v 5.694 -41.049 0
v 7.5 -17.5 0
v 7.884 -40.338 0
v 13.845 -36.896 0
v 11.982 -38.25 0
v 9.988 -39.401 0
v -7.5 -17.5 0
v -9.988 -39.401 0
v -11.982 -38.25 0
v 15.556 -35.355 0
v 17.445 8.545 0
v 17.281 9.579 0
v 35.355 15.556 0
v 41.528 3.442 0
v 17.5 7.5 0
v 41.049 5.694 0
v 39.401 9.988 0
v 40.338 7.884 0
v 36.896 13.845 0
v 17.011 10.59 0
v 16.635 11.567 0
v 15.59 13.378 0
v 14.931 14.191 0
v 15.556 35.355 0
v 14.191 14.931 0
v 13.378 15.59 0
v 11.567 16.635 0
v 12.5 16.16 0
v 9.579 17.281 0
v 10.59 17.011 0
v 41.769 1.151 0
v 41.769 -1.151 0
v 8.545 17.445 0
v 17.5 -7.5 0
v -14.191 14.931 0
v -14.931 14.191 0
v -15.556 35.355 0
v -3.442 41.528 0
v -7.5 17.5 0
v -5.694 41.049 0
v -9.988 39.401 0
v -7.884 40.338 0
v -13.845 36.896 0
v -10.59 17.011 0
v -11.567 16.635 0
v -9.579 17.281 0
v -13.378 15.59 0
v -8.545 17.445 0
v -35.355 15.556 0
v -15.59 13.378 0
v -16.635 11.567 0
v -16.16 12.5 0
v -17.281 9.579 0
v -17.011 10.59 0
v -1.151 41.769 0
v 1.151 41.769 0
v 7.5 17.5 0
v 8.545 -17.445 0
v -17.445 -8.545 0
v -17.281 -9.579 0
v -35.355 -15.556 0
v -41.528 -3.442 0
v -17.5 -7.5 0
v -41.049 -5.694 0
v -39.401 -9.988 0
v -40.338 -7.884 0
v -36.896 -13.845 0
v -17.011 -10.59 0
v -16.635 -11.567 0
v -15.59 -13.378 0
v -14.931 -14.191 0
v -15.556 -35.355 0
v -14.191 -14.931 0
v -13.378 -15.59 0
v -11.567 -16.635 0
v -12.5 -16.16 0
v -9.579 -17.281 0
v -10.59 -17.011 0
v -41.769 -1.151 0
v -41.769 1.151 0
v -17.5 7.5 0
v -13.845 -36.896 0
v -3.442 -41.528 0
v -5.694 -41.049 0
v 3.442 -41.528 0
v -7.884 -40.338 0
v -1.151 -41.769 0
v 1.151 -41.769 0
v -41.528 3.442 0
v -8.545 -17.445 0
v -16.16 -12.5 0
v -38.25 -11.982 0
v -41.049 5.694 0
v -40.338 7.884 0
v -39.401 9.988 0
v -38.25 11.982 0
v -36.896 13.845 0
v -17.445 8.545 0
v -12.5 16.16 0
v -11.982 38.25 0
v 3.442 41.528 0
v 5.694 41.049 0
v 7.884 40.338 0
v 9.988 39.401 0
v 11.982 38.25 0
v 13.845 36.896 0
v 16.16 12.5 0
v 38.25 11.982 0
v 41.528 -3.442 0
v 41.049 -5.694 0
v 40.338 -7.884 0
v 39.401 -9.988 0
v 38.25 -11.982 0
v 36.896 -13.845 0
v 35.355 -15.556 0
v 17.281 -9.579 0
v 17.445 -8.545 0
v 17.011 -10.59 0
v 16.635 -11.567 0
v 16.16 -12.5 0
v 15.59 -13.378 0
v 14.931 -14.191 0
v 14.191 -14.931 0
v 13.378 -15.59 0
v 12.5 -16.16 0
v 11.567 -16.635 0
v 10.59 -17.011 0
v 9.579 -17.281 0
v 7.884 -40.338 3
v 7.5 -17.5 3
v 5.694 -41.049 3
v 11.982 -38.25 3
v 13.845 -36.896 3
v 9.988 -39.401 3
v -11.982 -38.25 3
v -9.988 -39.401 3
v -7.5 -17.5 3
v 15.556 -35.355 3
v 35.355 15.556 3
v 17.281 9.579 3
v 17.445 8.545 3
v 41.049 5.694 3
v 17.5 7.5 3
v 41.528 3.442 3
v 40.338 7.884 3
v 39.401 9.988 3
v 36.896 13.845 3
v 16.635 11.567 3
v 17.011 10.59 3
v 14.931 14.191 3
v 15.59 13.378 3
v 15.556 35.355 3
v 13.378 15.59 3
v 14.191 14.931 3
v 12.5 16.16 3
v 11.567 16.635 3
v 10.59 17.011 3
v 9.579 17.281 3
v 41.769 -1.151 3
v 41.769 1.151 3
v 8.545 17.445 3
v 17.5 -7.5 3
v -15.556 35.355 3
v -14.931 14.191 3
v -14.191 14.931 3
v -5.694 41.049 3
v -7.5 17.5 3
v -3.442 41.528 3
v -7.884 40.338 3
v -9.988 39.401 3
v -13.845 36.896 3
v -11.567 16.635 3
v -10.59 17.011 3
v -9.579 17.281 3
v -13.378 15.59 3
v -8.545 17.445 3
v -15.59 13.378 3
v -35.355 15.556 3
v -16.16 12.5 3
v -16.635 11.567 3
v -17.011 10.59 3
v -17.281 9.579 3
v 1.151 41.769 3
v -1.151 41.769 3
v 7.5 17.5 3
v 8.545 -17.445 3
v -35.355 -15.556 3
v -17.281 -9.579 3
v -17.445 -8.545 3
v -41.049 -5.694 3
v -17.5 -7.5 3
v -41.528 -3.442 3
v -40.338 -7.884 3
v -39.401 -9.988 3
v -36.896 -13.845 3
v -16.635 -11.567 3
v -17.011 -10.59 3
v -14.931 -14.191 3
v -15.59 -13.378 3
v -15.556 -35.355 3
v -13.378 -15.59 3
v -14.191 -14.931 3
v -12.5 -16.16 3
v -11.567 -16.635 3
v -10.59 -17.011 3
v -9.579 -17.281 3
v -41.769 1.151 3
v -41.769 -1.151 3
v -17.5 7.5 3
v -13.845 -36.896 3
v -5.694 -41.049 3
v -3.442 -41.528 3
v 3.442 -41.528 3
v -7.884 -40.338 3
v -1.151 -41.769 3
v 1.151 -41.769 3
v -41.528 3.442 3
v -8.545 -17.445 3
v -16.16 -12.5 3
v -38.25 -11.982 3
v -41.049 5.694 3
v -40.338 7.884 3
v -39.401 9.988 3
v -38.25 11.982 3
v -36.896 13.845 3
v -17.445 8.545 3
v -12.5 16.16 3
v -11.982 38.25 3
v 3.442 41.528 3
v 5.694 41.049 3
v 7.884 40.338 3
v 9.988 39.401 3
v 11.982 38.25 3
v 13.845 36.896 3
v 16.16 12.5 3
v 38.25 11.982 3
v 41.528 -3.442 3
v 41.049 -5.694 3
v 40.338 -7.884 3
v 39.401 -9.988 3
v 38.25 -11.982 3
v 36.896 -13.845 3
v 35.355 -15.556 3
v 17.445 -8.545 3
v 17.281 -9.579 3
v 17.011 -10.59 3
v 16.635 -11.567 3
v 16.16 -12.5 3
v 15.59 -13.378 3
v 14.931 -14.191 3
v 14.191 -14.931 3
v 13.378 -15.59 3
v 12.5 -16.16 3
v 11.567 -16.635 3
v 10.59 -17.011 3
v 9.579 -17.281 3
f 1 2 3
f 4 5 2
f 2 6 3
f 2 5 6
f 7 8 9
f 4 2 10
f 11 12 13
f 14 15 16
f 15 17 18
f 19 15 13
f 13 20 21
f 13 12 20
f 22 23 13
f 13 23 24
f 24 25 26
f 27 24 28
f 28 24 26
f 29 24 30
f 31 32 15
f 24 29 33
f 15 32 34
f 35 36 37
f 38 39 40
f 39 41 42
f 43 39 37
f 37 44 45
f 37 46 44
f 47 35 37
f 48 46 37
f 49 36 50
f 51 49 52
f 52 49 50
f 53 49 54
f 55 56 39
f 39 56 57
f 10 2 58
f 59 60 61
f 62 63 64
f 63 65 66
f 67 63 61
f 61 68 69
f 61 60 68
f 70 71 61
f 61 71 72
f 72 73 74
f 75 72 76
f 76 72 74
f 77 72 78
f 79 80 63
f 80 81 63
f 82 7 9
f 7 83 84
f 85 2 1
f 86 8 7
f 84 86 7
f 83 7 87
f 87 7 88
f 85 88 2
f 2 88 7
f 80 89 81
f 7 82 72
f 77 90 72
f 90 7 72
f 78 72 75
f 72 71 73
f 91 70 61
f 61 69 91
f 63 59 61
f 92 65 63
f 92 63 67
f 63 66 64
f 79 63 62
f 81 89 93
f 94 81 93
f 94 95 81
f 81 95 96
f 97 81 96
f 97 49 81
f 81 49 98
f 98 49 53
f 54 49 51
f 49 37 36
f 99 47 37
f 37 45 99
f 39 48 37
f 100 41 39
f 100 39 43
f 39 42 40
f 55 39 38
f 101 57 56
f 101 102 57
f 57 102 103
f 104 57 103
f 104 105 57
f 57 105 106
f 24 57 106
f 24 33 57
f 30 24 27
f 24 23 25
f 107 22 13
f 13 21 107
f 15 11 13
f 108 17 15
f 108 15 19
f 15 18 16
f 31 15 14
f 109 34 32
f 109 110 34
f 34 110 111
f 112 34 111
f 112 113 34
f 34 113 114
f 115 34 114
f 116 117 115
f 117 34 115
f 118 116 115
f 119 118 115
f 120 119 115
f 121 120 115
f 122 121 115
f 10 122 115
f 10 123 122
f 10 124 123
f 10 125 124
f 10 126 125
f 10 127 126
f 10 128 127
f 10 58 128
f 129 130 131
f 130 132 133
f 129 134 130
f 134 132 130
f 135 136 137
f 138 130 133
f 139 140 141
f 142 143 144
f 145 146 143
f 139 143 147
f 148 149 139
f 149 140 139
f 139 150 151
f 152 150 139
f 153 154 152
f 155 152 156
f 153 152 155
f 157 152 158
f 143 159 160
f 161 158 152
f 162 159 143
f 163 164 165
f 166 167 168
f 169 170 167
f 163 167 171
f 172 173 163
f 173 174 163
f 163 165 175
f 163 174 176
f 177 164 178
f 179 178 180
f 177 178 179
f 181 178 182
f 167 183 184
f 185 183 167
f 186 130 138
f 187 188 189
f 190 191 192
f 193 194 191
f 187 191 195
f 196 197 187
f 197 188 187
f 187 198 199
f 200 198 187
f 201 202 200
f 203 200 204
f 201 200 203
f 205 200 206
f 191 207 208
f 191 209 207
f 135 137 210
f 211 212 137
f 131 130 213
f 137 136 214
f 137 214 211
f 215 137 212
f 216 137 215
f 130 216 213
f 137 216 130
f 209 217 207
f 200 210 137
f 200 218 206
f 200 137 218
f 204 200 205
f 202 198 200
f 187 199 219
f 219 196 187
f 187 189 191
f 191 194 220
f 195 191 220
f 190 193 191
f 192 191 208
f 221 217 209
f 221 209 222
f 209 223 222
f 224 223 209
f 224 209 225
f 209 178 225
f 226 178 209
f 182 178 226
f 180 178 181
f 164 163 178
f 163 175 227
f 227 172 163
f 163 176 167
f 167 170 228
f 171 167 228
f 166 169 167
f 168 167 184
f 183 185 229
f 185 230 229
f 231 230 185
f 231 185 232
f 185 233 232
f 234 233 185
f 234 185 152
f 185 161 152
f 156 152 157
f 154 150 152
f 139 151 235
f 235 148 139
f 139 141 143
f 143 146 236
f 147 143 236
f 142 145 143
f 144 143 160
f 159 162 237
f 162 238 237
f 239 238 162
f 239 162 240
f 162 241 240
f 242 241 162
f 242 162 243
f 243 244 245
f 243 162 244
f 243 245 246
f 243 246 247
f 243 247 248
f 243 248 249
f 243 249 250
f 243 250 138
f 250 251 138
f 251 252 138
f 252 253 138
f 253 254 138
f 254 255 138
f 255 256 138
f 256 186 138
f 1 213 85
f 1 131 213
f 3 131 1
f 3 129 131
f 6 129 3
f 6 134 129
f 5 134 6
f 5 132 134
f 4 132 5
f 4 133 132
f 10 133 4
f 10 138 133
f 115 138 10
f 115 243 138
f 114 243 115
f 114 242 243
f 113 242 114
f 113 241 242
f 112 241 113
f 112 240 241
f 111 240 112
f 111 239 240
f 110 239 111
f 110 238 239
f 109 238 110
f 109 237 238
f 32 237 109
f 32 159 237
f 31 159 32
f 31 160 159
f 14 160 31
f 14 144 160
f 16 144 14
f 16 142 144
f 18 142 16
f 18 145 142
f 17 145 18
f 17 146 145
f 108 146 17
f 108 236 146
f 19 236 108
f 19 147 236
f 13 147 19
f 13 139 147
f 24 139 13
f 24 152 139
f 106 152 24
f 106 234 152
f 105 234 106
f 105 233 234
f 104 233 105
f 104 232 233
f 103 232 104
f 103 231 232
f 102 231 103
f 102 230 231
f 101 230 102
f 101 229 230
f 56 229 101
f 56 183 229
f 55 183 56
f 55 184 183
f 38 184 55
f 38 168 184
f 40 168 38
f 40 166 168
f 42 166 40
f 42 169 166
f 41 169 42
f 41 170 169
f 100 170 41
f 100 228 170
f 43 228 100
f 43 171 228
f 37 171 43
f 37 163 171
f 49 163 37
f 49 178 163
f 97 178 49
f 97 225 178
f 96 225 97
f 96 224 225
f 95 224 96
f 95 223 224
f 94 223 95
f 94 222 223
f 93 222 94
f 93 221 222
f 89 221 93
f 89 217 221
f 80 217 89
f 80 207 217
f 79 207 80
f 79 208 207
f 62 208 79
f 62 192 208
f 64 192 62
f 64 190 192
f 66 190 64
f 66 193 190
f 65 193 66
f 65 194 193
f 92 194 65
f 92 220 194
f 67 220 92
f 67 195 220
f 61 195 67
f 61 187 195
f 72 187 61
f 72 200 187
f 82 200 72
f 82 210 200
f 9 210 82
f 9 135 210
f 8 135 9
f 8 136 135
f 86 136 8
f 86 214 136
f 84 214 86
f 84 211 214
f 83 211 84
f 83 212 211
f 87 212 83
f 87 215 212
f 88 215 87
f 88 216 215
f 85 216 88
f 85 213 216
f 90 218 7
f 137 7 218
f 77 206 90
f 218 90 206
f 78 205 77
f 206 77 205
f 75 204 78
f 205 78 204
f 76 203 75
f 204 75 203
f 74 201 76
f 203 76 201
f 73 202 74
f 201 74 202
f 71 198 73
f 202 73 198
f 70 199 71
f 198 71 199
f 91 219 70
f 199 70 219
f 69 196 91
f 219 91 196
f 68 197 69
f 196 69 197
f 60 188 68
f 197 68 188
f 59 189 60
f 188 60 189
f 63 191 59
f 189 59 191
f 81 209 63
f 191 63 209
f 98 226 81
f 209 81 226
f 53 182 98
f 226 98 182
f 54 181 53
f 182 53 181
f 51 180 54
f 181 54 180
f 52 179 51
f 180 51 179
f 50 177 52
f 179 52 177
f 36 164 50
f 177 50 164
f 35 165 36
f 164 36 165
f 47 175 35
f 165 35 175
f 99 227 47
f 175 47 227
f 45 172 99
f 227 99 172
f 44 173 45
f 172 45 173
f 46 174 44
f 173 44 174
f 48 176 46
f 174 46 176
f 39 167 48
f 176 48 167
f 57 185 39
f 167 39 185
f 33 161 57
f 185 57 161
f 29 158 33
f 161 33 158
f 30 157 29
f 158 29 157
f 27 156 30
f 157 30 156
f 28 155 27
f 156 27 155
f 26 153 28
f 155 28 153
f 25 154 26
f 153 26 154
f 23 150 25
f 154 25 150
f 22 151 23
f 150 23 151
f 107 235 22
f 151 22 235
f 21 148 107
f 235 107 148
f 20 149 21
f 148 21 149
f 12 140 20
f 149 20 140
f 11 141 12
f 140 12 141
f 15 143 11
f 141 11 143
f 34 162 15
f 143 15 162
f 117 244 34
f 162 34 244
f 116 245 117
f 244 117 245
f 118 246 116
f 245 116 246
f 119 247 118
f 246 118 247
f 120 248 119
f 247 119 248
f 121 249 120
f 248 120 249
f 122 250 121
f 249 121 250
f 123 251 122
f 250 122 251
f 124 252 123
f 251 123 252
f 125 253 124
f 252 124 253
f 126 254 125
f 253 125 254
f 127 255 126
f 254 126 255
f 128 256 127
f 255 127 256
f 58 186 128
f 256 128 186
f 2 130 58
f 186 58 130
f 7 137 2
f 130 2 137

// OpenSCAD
// file: coaster_lib.scad
$fa = 6;
$fs = 0.875;

module coaster_base_3d(size, thickness, border_radius) {
    linear_extrude(height = thickness) {
        minkowski() {
            cube_size = size - border_radius * 2;

            square(size = [cube_size, cube_size], center = true);
            circle(r = border_radius);
        }
    }
}

module epayslips_logo_2d(size) {
    difference() {
        rotate(a = 45)
        minkowski() {
            roundness = 22;
            cube_size = size * 0.5 - roundness;

            square(size = [cube_size, cube_size], center = true);
            circle(r = roundness);
        }

        minkowski() {
            roundness = 10;
            cube_size = size * 0.25 - roundness;

            square(size = [cube_size, cube_size], center = true);
            circle(r = roundness);
        }
    }
}

module datacode_logo_2d(size) {
    difference() {
        rotate(a = 45 / 2)
        minkowski() {
            roundness = 8;
            circle(r = size * 0.38 - roundness, $fn = 8);
            circle(r = roundness);
        }

        circle(r = size * 0.12);

        translate([0, size / 4, 0]) {
            square(size = [size * 0.1, size / 2], center = true);
        }
    }
}

module sj_logo_2d(size) {
    rotate(a = 45 / 2)
    difference() {
        roundness = 8;

        minkowski() {
            circle(r = size * 0.45 - roundness, $fn = 8);
            circle(r = roundness);
        }

        minkowski() {
            circle(r = size * 0.385 - roundness, $fn = 8);
            circle(r = roundness);
        }
    }

    text_size = size * 0.2;
    text_offset = text_size / 2 + 2;

    translate([0, text_offset, 0])
    text(
        text = "JAC",
        halign = "center",
        valign = "center",
        font = "Roboto Mono for Powerline:style=Bold",
        size = size * 0.2
    );

    translate([0, -text_offset, 0])
    text(
        text = "UZI",
        halign = "center",
        valign = "center",
        font = "Roboto Mono for Powerline:style=Bold",
        size = size * 0.2
    );
}
// main file
include<coaster_lib.scad>;

$fa = 6;
$fs = 0.875;

size = 100;
border_radius = 14;
thickness = 6;

linear_extrude(height = thickness / 2) {
    epayslips_logo_2d(size);
}
